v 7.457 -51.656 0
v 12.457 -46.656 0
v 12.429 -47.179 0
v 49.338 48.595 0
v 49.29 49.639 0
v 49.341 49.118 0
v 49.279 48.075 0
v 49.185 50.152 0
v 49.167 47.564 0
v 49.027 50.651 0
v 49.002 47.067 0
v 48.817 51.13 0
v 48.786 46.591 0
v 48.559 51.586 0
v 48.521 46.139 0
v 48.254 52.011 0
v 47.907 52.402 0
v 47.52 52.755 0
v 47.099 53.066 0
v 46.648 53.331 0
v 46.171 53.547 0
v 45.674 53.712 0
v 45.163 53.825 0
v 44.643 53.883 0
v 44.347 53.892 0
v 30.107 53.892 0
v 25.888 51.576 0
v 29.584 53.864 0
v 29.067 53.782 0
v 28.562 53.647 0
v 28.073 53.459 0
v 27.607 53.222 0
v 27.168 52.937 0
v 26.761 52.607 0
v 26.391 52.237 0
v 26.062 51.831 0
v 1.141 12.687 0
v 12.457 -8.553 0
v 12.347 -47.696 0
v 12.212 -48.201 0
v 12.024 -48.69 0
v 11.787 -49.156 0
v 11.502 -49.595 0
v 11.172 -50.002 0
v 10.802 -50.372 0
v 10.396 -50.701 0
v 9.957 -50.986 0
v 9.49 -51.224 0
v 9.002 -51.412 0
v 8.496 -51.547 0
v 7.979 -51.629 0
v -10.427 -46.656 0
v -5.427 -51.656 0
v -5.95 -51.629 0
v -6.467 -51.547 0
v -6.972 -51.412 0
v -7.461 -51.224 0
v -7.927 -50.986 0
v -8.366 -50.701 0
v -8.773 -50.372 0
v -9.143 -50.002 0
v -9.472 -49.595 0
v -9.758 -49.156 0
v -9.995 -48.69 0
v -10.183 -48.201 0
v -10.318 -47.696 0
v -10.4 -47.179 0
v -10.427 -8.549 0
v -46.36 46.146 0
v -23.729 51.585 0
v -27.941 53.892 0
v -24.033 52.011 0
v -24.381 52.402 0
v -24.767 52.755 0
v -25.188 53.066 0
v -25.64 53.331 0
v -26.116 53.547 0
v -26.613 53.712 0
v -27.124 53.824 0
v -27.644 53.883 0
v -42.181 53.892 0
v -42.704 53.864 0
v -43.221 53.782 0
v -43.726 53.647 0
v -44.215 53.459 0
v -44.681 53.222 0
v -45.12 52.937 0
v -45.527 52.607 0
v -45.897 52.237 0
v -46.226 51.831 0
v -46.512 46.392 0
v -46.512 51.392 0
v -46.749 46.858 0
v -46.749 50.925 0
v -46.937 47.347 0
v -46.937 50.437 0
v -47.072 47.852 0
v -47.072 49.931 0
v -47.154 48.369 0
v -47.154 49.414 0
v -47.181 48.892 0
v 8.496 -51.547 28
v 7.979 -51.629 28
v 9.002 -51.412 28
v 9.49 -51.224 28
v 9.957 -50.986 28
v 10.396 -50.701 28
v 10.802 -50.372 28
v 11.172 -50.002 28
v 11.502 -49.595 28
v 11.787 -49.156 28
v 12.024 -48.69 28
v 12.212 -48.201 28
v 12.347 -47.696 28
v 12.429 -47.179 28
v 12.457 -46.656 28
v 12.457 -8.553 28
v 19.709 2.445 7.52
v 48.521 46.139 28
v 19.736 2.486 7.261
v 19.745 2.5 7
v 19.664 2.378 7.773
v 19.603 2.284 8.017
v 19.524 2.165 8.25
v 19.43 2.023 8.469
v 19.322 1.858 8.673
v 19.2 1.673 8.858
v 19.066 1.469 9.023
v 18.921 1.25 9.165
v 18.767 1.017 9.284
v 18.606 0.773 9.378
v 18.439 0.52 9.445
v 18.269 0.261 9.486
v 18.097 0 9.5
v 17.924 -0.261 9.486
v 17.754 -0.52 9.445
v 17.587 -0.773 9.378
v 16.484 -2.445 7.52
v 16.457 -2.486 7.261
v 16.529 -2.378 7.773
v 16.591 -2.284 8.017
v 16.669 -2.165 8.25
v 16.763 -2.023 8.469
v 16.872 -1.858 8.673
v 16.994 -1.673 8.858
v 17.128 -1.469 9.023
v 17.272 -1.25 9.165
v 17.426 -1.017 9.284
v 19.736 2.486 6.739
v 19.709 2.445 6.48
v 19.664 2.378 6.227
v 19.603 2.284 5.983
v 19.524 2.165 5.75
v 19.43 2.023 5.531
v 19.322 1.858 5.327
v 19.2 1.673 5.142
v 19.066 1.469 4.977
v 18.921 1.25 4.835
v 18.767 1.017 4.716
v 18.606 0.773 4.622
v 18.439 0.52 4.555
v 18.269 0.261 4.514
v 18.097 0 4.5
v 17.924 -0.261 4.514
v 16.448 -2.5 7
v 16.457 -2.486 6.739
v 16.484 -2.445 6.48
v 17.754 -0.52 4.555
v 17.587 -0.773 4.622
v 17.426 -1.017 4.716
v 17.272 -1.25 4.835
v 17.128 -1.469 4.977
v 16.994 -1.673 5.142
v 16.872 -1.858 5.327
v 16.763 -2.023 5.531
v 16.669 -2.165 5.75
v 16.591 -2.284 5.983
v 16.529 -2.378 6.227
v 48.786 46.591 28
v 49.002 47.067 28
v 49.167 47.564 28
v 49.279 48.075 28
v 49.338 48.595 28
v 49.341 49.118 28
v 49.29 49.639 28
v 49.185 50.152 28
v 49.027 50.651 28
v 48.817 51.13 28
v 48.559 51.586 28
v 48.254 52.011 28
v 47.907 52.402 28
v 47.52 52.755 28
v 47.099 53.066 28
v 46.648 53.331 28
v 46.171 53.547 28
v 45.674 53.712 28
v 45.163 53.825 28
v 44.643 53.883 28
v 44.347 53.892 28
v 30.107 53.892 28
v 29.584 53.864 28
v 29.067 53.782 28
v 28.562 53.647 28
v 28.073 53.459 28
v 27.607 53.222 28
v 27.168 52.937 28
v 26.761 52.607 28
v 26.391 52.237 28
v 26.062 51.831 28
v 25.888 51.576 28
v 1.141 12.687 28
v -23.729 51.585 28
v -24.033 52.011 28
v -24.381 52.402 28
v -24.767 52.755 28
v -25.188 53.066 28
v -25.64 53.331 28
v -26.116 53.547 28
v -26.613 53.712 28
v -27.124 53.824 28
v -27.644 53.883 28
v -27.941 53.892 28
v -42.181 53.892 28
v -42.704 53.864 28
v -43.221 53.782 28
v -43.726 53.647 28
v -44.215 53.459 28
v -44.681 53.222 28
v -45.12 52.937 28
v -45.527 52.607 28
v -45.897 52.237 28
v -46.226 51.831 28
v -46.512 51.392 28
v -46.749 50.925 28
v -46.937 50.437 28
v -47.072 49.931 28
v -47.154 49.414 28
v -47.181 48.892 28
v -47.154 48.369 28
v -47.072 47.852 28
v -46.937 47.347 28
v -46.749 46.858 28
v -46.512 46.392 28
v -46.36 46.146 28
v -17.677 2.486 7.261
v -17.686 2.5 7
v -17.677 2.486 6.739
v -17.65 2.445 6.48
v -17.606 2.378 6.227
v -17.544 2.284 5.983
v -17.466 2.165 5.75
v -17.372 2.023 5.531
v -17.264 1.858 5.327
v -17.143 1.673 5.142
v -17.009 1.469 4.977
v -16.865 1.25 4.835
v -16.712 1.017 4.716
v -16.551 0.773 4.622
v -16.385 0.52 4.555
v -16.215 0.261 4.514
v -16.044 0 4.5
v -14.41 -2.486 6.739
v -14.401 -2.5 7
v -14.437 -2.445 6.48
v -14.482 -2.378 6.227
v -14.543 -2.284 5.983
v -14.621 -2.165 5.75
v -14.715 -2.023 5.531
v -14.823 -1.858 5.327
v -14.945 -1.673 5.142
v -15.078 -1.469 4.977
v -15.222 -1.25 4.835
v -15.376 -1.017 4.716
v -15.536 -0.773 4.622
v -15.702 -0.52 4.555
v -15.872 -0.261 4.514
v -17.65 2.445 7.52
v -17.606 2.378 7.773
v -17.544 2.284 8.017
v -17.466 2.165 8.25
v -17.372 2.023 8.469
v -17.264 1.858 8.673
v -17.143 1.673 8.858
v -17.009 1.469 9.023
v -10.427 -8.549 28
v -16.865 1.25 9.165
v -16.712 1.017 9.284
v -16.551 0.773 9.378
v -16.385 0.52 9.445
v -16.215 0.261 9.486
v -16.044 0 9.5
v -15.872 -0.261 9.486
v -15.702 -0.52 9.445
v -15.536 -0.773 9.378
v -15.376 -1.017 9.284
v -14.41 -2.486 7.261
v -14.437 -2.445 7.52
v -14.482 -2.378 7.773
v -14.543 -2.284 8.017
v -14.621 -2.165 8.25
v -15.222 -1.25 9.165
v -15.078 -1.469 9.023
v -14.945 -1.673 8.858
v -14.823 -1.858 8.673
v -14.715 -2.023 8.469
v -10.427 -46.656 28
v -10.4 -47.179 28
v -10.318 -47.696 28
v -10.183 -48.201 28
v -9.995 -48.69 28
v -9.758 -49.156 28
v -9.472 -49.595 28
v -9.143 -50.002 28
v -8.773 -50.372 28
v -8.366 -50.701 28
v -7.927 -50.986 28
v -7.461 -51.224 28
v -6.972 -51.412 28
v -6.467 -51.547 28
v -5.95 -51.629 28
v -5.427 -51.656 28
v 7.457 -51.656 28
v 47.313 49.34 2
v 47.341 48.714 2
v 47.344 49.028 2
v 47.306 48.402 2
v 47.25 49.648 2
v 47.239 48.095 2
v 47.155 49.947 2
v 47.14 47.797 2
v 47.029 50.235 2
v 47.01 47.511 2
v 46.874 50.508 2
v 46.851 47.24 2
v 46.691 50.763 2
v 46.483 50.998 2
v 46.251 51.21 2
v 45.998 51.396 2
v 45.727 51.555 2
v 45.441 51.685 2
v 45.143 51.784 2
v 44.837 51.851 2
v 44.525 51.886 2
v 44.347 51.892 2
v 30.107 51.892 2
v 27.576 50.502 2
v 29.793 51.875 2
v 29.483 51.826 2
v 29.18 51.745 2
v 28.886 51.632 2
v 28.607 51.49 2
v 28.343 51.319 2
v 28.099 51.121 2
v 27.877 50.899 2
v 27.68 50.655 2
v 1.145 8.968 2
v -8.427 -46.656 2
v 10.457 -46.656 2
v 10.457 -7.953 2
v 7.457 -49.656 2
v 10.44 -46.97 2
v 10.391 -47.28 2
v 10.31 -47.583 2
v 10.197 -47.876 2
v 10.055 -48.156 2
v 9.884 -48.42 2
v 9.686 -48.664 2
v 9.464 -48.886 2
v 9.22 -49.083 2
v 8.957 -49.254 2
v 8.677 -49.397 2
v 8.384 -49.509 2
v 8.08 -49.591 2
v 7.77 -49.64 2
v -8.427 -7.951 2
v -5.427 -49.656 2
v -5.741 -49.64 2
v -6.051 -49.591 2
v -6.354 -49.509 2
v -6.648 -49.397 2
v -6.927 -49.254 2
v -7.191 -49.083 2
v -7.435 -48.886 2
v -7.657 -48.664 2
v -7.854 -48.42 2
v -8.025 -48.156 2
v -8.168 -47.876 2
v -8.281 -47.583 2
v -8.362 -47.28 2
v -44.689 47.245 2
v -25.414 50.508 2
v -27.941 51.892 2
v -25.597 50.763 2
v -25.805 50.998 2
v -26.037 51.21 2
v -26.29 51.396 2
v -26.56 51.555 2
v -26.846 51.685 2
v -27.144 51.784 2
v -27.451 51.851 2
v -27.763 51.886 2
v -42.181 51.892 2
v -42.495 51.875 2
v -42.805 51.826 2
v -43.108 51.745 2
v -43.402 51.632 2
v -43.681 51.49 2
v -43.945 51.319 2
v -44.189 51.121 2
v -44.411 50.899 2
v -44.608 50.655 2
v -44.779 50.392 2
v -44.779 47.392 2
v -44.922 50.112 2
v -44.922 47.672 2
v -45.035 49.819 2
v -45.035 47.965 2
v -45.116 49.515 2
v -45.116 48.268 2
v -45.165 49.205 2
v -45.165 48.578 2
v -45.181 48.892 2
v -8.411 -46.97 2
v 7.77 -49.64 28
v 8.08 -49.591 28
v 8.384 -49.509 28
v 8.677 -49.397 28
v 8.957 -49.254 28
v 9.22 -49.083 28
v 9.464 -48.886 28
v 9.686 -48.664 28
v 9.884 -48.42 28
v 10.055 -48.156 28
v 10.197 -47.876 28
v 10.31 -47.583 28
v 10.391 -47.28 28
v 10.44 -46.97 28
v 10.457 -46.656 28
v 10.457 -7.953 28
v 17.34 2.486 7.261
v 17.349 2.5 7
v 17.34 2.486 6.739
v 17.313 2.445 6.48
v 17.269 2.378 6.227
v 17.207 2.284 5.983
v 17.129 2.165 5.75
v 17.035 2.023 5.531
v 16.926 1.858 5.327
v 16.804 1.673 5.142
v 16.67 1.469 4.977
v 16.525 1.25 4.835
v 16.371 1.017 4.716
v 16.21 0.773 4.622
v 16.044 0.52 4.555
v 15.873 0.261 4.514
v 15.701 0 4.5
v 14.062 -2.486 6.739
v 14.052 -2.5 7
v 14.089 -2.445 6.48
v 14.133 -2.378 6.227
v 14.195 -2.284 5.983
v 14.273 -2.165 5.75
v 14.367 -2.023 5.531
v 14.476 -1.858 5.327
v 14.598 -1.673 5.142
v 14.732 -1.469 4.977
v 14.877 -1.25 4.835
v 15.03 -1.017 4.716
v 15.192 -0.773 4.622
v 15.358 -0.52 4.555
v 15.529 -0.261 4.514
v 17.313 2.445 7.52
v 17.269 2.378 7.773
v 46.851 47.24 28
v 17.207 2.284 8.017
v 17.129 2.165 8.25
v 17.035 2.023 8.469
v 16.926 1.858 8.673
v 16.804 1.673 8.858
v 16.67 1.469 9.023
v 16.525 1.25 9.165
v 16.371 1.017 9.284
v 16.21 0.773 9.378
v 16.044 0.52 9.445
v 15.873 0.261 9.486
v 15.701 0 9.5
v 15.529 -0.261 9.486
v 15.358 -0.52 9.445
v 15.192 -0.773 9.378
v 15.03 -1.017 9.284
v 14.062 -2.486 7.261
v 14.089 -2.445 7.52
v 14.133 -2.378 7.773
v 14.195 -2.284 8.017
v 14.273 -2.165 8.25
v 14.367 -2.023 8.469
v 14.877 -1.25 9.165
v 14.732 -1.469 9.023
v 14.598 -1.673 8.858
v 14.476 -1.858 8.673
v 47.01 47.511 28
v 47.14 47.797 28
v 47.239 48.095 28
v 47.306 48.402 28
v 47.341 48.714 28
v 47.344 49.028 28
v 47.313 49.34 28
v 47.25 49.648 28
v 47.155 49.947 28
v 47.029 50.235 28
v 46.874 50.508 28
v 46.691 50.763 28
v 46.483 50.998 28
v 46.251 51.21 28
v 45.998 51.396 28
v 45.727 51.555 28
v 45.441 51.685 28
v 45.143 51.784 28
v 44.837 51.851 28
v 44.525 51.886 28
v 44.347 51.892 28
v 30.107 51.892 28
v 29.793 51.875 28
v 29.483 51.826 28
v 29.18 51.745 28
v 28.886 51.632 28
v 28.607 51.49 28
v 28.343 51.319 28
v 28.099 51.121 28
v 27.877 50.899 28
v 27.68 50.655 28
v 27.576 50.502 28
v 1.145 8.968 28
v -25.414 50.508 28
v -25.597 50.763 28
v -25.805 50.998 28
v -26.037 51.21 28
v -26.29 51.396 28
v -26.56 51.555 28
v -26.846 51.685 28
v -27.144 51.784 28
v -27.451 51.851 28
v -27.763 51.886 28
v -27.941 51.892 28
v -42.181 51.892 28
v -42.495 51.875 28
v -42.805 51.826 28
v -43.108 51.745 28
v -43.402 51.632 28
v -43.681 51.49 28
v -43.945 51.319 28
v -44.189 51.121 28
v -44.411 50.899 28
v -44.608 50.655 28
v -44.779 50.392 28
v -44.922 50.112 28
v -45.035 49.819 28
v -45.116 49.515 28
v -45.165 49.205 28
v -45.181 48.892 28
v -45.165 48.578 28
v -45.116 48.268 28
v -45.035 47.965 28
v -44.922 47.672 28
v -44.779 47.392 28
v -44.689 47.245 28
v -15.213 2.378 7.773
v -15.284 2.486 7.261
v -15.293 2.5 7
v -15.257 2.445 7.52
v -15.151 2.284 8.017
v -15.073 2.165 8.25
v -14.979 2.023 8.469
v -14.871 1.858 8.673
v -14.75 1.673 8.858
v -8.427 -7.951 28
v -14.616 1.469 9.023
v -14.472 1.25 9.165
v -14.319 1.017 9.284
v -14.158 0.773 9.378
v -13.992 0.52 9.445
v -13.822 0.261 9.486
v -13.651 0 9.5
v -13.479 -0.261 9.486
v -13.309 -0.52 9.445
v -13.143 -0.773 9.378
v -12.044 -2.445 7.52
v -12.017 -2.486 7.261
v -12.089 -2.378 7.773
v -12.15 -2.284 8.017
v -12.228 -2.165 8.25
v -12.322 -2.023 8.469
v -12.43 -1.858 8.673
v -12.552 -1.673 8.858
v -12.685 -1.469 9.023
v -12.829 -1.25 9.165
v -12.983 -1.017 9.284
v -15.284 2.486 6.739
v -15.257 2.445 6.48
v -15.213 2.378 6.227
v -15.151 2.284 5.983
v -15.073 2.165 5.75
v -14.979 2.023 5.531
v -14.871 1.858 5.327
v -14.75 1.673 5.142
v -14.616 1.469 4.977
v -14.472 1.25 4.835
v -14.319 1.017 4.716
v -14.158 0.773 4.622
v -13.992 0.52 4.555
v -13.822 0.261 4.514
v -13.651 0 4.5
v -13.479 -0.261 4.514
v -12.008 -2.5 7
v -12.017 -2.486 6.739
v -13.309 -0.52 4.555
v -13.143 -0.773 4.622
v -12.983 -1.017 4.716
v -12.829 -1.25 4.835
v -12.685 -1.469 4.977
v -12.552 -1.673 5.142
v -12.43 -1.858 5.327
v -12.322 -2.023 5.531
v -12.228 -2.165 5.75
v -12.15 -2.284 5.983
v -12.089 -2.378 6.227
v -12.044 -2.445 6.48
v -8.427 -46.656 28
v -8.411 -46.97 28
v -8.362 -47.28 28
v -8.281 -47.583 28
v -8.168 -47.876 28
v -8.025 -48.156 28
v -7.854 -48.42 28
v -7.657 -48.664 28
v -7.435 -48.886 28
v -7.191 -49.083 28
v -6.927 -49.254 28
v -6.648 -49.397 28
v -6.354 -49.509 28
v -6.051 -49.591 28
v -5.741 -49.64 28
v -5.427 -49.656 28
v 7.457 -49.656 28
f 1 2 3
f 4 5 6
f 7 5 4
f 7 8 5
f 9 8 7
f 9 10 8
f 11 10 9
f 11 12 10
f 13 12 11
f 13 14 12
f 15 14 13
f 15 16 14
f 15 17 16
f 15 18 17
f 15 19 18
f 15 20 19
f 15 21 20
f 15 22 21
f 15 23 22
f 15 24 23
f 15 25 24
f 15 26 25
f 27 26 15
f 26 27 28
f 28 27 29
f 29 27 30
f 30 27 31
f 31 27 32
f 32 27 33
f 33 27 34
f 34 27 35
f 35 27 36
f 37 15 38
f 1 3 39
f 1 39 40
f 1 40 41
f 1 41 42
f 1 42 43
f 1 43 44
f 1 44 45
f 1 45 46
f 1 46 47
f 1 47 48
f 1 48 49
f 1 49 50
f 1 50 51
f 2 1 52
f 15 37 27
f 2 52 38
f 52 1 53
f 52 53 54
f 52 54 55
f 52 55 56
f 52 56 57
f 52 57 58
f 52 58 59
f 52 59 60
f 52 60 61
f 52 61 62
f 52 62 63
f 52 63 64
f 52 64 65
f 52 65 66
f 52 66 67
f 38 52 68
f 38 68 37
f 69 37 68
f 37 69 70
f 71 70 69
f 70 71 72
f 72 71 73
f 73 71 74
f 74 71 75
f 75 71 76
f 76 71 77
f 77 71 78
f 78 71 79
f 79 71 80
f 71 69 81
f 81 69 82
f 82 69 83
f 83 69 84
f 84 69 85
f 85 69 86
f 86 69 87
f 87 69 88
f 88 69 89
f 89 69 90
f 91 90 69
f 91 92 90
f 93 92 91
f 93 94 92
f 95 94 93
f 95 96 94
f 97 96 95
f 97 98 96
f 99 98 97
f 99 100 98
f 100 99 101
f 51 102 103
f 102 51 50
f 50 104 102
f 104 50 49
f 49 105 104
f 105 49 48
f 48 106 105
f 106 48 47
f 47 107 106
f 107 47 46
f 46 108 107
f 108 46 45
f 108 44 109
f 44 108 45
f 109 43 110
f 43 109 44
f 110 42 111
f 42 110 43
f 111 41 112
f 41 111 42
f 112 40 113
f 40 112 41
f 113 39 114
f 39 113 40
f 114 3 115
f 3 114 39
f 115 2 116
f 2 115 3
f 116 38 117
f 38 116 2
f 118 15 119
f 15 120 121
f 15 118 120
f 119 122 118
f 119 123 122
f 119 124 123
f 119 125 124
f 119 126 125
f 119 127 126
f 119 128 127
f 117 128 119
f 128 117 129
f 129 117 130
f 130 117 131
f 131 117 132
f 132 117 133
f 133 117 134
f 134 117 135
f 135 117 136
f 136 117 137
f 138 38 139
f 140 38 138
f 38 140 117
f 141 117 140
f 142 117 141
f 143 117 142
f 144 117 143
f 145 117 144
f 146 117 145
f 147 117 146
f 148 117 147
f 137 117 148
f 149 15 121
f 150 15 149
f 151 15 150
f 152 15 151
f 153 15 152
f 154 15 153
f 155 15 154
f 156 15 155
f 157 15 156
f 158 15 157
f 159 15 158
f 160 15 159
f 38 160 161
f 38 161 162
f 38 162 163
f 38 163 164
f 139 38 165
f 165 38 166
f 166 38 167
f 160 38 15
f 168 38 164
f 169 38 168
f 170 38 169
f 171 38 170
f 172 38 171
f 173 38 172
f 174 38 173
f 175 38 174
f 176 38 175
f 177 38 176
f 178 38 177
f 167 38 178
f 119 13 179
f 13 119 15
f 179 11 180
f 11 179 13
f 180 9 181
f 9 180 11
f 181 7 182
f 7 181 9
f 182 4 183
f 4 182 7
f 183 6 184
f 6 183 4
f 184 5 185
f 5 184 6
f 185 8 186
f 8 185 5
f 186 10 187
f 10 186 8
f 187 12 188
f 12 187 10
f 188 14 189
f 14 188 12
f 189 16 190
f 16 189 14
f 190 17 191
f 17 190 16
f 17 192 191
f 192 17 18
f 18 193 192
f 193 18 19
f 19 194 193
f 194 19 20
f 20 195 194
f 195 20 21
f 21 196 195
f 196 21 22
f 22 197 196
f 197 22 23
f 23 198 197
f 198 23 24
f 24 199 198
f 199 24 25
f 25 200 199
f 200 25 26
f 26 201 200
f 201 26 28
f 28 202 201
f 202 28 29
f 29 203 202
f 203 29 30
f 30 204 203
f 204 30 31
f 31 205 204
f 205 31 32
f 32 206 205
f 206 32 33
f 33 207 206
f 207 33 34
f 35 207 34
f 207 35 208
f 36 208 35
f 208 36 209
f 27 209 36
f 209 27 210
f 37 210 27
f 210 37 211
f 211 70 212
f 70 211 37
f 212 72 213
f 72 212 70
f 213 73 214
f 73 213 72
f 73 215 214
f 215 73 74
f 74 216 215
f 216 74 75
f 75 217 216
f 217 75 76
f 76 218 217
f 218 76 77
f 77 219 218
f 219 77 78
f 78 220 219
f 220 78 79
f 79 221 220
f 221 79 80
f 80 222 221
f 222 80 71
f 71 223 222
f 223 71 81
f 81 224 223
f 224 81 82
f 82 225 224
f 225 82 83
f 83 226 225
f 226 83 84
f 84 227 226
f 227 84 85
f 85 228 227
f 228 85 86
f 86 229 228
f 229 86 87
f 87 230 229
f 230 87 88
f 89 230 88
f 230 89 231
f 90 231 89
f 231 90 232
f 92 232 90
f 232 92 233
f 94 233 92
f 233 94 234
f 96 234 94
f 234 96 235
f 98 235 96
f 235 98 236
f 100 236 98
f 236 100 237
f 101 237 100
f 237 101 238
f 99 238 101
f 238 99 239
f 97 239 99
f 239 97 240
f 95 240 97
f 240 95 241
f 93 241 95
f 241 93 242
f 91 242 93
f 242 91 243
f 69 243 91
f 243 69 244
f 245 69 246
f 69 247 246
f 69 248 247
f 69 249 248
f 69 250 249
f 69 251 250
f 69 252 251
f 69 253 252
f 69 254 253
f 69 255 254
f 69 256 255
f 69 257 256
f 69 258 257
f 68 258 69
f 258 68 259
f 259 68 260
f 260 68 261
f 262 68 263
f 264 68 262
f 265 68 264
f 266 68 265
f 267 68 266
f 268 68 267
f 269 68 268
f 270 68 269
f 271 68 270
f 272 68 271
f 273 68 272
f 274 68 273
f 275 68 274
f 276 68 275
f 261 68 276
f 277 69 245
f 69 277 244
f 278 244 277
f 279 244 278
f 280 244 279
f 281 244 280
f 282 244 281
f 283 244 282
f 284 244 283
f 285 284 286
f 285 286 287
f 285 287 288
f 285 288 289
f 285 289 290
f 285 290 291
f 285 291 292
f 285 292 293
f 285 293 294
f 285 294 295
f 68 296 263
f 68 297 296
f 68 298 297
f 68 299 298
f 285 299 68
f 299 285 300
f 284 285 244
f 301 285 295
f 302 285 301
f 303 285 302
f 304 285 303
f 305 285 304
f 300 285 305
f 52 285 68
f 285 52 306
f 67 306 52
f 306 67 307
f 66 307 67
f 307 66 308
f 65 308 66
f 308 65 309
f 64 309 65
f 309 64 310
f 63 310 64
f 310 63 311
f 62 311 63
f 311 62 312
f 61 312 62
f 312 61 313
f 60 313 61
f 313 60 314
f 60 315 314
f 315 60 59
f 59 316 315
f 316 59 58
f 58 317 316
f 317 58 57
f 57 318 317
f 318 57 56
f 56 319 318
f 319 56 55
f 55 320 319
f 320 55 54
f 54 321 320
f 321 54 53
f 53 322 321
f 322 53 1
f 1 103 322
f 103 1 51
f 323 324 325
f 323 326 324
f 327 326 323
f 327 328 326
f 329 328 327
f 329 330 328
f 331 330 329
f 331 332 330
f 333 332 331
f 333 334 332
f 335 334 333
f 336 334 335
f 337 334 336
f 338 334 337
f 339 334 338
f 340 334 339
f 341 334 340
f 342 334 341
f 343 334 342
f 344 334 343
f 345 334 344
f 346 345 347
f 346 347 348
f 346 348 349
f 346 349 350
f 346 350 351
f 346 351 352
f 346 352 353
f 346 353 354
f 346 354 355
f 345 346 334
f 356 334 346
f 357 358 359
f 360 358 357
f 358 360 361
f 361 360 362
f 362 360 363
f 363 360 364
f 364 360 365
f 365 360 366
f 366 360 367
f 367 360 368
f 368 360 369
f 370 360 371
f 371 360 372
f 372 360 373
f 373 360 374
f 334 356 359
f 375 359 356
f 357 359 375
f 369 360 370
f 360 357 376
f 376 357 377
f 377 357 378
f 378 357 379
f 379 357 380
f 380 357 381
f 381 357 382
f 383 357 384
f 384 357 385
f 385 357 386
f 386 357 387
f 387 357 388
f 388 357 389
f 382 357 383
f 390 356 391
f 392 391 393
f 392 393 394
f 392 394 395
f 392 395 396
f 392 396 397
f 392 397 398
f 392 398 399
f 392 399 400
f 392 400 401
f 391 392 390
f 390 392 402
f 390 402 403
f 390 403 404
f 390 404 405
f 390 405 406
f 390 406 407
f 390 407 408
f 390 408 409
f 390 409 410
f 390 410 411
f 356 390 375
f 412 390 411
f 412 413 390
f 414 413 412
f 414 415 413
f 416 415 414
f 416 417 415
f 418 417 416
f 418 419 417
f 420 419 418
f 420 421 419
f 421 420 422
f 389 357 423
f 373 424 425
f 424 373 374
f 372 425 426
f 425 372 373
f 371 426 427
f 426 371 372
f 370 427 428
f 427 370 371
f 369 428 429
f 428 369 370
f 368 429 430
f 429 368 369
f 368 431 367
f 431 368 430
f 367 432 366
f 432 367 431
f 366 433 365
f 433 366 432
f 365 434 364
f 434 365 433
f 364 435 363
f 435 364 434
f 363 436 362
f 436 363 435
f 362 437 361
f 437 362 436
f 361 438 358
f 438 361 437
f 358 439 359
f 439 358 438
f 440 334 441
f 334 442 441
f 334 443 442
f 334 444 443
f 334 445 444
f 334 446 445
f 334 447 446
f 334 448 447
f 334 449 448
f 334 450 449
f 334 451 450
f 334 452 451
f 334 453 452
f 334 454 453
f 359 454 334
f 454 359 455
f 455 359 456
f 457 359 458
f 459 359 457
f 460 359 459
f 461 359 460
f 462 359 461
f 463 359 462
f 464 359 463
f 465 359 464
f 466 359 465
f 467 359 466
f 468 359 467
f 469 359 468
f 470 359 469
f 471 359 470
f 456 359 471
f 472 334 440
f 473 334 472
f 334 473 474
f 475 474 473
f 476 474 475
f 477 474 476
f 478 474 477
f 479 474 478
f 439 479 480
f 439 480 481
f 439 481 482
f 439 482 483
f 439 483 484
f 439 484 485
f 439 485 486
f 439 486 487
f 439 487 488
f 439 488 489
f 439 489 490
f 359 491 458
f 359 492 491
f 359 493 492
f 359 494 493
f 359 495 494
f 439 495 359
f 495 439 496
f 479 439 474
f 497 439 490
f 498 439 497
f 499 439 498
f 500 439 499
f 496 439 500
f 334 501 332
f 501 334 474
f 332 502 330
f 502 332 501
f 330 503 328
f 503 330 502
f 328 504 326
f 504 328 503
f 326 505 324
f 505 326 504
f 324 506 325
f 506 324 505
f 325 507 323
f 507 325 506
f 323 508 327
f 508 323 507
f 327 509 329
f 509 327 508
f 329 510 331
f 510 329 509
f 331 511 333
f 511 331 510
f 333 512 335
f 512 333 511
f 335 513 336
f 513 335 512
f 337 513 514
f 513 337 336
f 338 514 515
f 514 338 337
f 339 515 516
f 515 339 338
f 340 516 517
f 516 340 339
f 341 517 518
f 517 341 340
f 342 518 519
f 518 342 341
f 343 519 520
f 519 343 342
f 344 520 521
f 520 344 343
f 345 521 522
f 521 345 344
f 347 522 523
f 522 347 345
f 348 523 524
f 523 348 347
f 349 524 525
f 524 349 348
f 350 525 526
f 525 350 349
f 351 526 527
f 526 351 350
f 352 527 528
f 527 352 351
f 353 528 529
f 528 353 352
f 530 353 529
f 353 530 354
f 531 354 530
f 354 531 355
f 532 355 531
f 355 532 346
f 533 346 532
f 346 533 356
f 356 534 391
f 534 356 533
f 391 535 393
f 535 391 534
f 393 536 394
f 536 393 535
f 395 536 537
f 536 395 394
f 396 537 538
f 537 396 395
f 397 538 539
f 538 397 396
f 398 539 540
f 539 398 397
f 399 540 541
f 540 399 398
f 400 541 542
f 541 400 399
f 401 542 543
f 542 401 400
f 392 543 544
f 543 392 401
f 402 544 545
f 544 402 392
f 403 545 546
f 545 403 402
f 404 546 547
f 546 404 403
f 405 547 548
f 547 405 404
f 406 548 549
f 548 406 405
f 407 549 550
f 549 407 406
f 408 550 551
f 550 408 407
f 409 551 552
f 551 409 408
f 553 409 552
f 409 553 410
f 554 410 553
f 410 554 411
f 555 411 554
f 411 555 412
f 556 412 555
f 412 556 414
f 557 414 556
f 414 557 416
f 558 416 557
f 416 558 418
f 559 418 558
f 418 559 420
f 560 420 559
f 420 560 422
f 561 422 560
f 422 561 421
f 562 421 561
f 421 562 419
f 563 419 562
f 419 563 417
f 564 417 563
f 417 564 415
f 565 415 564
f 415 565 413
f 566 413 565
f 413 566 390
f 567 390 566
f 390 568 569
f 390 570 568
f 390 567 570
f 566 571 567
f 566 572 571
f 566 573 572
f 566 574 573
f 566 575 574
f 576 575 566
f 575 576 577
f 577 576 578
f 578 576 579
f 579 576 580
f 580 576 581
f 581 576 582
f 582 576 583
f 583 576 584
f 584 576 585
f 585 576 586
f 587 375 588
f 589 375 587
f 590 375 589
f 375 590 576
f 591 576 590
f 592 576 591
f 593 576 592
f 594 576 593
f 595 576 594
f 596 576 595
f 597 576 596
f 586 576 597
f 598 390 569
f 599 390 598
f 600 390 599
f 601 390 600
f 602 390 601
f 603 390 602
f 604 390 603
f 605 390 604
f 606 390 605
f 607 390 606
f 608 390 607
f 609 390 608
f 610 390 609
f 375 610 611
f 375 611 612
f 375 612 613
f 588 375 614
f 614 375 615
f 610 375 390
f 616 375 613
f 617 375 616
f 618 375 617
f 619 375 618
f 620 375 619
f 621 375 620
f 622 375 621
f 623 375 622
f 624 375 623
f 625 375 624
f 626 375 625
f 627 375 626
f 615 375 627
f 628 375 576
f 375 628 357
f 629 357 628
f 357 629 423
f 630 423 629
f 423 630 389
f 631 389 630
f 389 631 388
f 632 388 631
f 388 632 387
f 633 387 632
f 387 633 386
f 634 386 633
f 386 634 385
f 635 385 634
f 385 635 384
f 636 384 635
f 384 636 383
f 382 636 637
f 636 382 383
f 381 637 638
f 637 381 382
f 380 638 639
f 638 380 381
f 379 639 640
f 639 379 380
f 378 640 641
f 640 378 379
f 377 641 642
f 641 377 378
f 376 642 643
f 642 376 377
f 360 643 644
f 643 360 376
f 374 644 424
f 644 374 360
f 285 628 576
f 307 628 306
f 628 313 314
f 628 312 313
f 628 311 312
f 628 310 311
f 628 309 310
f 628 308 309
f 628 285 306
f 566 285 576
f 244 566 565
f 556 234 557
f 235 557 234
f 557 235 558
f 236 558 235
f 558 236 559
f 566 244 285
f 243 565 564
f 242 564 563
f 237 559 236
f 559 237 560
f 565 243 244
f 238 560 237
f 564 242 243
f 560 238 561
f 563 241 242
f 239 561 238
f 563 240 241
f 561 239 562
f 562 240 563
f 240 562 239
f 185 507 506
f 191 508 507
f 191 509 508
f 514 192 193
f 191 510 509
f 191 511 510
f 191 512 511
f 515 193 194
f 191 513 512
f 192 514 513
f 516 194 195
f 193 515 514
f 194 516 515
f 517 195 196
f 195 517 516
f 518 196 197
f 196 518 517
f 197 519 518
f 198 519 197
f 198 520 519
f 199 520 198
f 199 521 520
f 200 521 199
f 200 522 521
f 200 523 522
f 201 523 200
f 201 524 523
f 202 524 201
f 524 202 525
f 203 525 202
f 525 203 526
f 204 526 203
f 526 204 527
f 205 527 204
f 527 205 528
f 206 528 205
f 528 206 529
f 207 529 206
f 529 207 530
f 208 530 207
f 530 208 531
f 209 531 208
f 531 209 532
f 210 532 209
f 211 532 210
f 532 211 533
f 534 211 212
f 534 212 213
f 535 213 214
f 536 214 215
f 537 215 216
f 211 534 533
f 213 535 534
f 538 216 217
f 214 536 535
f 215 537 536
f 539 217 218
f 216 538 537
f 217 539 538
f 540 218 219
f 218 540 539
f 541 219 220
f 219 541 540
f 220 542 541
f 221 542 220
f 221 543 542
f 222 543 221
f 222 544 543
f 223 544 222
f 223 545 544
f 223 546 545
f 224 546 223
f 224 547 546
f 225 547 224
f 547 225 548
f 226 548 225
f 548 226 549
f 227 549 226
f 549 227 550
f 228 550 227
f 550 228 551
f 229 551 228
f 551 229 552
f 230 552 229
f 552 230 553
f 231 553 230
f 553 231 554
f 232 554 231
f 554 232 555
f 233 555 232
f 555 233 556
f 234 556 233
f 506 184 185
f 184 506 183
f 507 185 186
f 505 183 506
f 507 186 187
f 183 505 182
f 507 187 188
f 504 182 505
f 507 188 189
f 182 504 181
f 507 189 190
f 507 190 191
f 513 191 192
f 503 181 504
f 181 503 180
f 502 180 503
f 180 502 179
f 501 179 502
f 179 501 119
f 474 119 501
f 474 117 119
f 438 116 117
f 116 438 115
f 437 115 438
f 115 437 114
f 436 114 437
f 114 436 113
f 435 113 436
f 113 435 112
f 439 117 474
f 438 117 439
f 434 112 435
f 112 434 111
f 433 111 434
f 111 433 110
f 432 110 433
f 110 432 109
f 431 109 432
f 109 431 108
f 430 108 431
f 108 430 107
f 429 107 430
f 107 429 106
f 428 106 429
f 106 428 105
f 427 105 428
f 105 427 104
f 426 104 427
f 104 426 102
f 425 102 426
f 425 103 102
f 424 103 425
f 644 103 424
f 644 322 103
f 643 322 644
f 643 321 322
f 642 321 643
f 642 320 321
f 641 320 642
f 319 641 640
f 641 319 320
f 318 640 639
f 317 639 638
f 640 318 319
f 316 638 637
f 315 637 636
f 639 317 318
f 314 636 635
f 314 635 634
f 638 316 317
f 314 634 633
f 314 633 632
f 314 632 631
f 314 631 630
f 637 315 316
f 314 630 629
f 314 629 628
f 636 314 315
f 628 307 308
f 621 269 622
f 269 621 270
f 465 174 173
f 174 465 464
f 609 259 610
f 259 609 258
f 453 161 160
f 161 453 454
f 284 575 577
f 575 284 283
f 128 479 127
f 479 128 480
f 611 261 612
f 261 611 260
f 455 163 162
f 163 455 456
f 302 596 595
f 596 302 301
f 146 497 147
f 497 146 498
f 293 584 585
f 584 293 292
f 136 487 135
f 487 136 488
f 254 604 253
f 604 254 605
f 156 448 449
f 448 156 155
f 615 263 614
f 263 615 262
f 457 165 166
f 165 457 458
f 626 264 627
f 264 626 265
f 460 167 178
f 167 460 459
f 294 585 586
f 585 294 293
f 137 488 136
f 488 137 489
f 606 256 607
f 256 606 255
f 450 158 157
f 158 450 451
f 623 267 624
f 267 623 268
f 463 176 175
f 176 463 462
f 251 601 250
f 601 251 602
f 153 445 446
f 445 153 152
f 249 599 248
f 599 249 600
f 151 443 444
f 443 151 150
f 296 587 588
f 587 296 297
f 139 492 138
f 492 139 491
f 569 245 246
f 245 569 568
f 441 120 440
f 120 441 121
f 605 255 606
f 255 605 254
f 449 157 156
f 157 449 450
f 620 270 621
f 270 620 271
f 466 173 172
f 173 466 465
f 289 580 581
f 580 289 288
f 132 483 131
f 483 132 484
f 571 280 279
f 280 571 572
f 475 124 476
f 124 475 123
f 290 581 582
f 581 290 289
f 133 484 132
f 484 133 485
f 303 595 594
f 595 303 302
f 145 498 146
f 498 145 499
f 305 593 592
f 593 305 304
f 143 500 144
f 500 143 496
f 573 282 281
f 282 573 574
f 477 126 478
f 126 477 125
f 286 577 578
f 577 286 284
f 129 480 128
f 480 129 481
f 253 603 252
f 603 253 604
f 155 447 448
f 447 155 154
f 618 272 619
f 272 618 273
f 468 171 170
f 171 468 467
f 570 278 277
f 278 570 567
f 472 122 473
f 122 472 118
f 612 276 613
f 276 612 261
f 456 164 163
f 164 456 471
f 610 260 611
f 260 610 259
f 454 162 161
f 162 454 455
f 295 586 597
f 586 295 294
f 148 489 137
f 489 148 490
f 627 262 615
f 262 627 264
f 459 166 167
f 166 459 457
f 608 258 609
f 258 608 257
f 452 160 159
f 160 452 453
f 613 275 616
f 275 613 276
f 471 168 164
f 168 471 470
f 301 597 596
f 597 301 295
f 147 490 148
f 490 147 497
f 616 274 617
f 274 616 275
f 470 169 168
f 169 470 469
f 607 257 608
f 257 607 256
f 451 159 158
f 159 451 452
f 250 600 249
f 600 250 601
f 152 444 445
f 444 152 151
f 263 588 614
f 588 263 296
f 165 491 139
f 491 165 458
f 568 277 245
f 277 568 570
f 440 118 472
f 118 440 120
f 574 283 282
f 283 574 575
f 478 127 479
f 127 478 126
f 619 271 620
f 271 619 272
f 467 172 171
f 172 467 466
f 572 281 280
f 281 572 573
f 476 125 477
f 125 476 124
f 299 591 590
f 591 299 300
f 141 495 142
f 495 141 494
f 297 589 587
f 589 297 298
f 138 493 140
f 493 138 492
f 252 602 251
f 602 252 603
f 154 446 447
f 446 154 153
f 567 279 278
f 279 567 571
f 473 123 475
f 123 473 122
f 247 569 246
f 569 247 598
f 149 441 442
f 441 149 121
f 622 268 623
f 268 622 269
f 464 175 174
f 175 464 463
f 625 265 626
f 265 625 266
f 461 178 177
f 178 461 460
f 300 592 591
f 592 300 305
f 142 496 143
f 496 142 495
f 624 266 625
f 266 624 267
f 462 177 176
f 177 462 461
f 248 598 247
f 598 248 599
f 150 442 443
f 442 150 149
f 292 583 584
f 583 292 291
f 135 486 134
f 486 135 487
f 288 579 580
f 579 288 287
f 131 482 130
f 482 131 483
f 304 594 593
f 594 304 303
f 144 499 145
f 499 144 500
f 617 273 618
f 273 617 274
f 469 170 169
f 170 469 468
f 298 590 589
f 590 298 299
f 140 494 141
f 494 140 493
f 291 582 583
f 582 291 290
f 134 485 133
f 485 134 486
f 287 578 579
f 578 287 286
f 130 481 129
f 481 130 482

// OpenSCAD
// AUTOMATICALLY GENERATED FILE: Letter_Y
// SIGN SCULPTOR ENGINE V2

Render_Mode = "Body"; // Set to "Lid" to export the cover
Letter = "Y";
Font_Size = 100;
Font_Name = "Arial:style=Black";
Light_Type = "Silicone_Neon_6mm";

// -- Engineering Constants --
Sign_Height = 30.0;
Wall_Thickness = 2.0;
Base_Thickness = 2.0;
Lid_Tolerance = 0.15;
Hole_Height = 5.0;
Hole_Size = 5.0;

// -- Logic Engine --
CW = (Light_Type == "Silicone_Neon_6mm") ? 6.0 :
     (Light_Type == "Silicone_Neon_8mm") ? 8.0 :
     (Light_Type == "LED_Strip_10mm")    ? 10.5 :
     (Light_Type == "Individual_Pixels")  ? 14.0 : 6.0;

Lip_Overhang = (Light_Type == "Silicone_Neon_6mm" || Light_Type == "Silicone_Neon_8mm") ? 0.4 : 0.0;

$fn = 60;

module letter_shape() {
    text(text=Letter, size=Font_Size, font=Font_Name, halign="center", valign="center");
}

module body_geometry() {
    difference() {
        // 1. Positive Block
        linear_extrude(Sign_Height)
            offset(r = CW/2 + Wall_Thickness)
            letter_shape();

        // 2. Light Channel
        translate([0,0, Base_Thickness])
            linear_extrude(Sign_Height + 1)
            offset(r = CW/2)
            letter_shape();

        // 3. Friction Lip
        if (Lip_Overhang > 0) {
            translate([0,0, Sign_Height - 2.0])
                linear_extrude(3.0)
                difference() {
                    offset(r = CW/2 + 5) letter_shape();
                    offset(r = CW/2 - Lip_Overhang) letter_shape();
                }
        }
        
        // 4. Lid Shelf
        translate([0,0, Sign_Height - 2.0])
            linear_extrude(3.0)
            offset(r = CW/2 + 1.5)
            letter_shape();

        // 5. WIRE CHANNELS (Dynamic Side Holes)
        // Left Hole
        translate([-Font_Size/1.8, 0, Hole_Height + Base_Thickness])
            rotate([0, 90, 0])
            cylinder(h = Font_Size, r = Hole_Size/2);
            
        // Right Hole
        translate([Font_Size/1.8, 0, Hole_Height + Base_Thickness])
            rotate([0, -90, 0])
            cylinder(h = Font_Size, r = Hole_Size/2);
    }
}

module lid_geometry() {
    color("White")
        linear_extrude(2.0)
        offset(r = (CW/2 + 1.5) - Lid_Tolerance)
        letter_shape();
}

// Render Controller
if (Render_Mode == "Body") {
    body_geometry();
} else if (Render_Mode == "Lid") {
    lid_geometry();
}
